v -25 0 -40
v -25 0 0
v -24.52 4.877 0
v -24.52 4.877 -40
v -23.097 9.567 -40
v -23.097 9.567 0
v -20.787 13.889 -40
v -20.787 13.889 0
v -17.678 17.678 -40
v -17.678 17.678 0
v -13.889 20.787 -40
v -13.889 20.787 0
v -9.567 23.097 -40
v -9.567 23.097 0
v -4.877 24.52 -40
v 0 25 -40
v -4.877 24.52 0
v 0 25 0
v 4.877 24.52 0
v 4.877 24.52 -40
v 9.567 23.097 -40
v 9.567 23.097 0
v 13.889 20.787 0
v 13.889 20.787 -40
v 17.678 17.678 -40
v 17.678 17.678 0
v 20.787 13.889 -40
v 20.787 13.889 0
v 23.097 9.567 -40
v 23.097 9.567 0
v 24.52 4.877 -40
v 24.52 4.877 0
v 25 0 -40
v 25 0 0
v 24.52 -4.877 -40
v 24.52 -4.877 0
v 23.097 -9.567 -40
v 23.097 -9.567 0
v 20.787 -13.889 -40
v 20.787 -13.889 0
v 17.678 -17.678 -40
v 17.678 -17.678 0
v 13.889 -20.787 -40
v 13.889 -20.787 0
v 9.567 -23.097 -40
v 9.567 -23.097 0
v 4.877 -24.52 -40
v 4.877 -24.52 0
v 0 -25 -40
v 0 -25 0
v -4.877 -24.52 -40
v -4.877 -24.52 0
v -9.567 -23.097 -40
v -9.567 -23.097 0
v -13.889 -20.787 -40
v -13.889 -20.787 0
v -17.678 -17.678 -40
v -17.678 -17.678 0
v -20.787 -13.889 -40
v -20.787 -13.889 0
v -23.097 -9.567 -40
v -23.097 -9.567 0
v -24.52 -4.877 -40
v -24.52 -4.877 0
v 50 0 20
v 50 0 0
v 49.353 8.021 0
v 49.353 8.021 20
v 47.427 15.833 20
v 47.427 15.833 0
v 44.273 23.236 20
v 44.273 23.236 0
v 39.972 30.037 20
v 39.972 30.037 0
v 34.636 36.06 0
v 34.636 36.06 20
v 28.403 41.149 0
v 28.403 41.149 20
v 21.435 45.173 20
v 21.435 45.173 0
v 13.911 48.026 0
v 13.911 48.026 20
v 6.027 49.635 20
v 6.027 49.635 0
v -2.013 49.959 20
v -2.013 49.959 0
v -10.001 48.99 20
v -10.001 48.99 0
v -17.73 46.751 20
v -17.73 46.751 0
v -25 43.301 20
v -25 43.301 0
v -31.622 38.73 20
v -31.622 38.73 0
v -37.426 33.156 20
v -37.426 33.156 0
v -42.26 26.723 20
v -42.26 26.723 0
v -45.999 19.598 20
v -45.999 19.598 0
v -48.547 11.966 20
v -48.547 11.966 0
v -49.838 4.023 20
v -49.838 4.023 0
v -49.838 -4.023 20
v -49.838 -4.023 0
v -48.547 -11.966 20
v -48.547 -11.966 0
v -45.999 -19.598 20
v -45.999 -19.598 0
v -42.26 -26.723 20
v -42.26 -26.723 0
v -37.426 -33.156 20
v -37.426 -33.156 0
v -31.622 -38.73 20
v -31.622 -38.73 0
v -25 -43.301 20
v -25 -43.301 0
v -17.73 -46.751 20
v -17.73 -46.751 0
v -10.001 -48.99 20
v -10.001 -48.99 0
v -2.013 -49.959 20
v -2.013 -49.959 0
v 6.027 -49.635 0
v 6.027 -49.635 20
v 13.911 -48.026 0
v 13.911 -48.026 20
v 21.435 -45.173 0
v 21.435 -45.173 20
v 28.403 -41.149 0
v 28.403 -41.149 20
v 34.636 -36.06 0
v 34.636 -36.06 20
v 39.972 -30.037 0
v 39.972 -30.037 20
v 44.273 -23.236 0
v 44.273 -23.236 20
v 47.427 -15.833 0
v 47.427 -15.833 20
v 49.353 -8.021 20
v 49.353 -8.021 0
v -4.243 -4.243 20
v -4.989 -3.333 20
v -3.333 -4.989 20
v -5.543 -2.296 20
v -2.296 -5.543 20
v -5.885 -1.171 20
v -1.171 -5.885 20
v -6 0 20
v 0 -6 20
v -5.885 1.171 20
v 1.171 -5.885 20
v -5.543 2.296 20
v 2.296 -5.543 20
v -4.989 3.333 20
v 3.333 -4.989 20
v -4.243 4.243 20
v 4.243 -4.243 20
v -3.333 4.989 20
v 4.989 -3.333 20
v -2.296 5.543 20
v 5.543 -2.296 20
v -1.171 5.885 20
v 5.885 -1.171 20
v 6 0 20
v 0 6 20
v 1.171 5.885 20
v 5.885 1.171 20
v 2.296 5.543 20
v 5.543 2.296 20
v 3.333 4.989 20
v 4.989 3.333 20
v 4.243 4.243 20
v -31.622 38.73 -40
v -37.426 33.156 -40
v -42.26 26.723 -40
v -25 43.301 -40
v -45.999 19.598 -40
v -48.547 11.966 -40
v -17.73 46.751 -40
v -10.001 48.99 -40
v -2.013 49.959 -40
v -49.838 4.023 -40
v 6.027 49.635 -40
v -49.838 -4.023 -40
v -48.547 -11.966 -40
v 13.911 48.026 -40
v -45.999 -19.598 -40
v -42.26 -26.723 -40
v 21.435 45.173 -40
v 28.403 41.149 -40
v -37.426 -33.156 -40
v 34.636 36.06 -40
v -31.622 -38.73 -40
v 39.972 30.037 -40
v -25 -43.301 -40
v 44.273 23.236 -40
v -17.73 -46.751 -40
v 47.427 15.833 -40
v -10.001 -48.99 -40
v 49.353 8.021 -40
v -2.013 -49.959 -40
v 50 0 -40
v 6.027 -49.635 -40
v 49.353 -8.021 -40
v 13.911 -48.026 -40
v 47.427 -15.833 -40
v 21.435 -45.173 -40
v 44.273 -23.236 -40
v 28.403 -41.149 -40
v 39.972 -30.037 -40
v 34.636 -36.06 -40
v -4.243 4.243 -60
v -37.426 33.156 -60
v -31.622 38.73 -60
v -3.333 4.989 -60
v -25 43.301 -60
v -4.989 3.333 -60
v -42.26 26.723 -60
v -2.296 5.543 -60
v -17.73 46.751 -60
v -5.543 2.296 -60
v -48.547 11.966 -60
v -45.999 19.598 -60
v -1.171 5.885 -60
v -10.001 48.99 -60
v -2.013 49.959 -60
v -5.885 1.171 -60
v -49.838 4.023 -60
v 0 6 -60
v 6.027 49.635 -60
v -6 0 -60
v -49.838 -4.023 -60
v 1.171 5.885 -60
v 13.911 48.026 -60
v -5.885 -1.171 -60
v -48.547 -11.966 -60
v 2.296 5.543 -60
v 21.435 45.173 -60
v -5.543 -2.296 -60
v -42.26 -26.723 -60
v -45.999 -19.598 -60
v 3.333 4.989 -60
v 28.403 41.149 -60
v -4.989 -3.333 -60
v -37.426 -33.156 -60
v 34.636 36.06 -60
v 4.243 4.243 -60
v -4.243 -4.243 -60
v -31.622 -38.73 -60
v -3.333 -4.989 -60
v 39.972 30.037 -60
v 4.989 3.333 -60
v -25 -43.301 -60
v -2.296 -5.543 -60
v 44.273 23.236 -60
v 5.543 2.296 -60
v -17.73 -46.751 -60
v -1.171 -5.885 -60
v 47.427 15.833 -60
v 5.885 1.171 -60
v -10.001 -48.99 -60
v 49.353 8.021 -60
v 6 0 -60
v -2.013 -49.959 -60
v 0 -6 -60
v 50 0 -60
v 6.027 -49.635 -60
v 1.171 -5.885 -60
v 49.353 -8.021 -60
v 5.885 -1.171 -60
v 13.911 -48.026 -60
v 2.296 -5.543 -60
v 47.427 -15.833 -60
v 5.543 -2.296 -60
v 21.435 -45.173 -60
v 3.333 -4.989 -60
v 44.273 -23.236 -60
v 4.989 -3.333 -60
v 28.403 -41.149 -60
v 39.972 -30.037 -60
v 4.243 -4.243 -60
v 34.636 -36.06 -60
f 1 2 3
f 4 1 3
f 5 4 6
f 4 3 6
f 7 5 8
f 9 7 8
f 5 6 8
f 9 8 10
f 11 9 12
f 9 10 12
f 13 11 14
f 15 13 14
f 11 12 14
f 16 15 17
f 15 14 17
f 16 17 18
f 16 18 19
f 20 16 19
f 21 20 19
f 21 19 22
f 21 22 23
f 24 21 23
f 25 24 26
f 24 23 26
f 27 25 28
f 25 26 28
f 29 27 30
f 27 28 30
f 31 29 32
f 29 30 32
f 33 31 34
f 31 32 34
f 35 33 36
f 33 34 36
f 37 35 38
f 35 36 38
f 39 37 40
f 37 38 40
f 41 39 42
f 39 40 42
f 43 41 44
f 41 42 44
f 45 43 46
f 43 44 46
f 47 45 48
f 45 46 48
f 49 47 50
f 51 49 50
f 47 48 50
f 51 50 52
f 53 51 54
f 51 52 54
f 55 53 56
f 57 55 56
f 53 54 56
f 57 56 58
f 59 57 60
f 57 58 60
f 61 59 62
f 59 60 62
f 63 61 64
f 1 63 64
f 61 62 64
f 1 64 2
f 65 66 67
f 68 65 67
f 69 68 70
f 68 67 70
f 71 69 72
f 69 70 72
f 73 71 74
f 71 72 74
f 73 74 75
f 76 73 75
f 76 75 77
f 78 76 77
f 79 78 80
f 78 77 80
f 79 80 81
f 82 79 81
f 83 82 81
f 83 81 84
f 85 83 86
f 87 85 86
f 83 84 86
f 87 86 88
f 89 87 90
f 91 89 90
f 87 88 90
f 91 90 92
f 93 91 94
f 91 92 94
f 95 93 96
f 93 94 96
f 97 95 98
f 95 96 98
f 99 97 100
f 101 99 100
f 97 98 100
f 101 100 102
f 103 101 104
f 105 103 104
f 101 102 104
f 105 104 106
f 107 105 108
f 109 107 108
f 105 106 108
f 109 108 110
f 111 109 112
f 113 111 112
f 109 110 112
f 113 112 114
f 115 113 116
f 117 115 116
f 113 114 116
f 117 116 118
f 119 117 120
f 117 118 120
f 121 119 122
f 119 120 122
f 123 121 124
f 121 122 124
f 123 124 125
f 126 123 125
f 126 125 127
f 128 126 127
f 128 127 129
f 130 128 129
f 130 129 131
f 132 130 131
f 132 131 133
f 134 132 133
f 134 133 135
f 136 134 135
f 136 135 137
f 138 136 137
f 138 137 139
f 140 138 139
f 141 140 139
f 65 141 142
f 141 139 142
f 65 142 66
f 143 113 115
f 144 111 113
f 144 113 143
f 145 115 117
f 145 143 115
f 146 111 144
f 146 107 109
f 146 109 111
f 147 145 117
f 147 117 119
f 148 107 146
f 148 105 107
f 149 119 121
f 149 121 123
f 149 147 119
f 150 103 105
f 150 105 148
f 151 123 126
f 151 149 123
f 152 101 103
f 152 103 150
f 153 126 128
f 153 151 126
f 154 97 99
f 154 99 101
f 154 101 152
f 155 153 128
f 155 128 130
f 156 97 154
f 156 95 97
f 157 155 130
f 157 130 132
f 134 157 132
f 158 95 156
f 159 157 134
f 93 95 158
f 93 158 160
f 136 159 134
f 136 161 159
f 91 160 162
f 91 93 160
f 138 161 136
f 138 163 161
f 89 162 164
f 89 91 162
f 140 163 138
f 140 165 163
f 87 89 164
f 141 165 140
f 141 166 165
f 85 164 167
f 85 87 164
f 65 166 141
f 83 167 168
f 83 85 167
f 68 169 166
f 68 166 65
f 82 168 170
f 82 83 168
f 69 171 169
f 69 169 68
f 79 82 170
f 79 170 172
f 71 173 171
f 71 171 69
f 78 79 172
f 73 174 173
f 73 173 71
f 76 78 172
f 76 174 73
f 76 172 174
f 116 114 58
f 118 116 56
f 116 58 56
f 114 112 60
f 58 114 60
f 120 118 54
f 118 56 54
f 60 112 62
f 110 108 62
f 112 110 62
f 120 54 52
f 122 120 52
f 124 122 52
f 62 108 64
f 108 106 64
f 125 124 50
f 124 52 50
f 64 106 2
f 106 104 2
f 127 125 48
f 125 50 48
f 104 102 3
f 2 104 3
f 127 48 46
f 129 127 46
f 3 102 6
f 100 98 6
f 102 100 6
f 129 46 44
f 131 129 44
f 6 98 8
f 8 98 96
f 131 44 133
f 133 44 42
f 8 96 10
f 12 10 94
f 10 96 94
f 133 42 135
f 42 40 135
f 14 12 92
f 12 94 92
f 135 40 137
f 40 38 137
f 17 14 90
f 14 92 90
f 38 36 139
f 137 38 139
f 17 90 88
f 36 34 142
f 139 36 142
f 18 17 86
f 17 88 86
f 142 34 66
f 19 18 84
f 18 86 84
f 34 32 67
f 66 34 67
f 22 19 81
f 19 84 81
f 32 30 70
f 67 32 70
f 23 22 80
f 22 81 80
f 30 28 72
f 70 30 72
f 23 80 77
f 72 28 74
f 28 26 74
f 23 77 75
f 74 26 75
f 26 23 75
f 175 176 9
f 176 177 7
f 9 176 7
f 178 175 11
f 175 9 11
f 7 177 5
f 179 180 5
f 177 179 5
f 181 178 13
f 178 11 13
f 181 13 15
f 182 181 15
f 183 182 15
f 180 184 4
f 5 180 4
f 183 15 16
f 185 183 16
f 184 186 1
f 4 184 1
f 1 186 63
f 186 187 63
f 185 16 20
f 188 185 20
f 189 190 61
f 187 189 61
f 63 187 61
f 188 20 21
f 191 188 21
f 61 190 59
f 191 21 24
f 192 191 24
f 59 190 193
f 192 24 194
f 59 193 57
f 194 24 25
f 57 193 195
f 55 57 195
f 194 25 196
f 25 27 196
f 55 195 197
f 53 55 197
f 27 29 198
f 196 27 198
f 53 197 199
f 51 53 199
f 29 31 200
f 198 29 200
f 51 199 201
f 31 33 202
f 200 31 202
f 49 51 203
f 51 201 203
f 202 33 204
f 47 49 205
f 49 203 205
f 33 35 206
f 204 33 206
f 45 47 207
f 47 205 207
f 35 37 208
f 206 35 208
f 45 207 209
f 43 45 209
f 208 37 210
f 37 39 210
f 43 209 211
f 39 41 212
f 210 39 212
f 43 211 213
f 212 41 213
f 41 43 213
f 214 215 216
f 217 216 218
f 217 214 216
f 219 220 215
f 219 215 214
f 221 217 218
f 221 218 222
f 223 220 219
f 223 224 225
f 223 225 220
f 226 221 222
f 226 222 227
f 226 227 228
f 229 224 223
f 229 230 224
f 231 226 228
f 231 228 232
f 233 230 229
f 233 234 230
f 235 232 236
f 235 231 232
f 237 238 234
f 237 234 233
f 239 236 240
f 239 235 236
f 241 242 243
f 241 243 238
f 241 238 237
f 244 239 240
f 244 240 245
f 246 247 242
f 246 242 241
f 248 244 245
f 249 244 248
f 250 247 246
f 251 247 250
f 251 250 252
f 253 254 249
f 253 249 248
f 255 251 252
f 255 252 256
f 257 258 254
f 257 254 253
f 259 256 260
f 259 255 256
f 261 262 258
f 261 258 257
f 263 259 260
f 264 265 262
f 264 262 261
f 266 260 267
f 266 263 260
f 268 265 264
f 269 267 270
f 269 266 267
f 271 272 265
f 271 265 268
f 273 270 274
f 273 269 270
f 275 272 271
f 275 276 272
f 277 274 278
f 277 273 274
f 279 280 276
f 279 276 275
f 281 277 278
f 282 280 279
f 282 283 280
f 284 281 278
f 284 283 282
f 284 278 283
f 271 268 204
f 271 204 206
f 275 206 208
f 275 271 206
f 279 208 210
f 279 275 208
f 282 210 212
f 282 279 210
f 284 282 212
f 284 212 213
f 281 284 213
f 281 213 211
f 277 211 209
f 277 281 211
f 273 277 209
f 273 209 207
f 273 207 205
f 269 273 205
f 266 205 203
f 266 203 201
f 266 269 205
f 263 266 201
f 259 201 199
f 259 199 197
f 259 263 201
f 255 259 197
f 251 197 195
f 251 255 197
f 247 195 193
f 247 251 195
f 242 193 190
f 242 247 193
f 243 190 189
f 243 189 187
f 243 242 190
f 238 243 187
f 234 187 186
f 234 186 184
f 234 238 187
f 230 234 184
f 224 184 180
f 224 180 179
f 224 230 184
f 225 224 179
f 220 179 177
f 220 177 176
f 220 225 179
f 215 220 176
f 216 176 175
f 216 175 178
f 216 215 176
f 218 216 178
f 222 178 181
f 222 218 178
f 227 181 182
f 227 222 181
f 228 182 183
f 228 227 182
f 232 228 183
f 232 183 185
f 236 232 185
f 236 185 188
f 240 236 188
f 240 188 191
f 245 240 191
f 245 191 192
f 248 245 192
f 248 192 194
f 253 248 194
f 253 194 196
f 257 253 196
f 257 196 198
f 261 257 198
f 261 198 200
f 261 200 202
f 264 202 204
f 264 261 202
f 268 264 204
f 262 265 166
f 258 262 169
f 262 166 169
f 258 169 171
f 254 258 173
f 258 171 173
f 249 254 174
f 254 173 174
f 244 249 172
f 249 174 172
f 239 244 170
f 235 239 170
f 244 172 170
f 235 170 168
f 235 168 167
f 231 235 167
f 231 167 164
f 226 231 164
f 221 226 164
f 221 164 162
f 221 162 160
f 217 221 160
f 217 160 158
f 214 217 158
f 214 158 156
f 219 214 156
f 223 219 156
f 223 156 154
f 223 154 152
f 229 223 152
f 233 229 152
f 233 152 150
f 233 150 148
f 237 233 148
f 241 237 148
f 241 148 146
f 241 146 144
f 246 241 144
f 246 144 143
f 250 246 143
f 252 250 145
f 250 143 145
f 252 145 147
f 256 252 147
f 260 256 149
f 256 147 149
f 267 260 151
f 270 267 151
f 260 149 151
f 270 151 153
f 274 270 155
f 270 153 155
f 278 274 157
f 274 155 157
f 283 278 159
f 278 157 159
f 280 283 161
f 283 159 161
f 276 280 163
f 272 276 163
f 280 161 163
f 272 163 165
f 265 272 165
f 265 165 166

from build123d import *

# Parameters (mm, degrees)
SKETCH1_R           = 50
BOSS_EXTRUDE1_DEPTH = 20
SKETCH2_R           = 25
BOSS_EXTRUDE2_DEPTH = 40
BOSS_EXTRUDE3_START = 20
SKETCH3_R           = 50
BOSS_EXTRUDE3_DEPTH = 20
SKETCH4_R           = 6
CUT_EXTRUDE1_DEPTH  = 107.77078252


with BuildPart() as part:
    # Sketch1 → Boss-Extrude1 (new body)
    with BuildSketch(Plane.XY):
        Circle(SKETCH1_R)
    extrude(amount=BOSS_EXTRUDE1_DEPTH)

    # Sketch2 → Boss-Extrude2 (add)
    with BuildSketch(Plane(origin=(0, 0, 0), x_dir=(-1, 0, 0), z_dir=(0, 0, -1))):
        Circle(SKETCH2_R)
    extrude(amount=BOSS_EXTRUDE2_DEPTH)

    # Sketch3 → Boss-Extrude3 (add)
    with BuildSketch(Plane(origin=(0, 0, -40), x_dir=(-1, 0, 0), z_dir=(0, 0, -1)).offset(BOSS_EXTRUDE3_START)):
        with Locations(Location((0, 0, 0), (0, 0, 180))):
            Circle(SKETCH3_R)
    extrude(amount=-BOSS_EXTRUDE3_DEPTH)

    # Sketch4 → Cut-Extrude1 (cut, through all)
    with BuildSketch(Plane.XY.offset(20)):
        Circle(SKETCH4_R)
    extrude(amount=-CUT_EXTRUDE1_DEPTH, mode=Mode.SUBTRACT)


solid = part.part
